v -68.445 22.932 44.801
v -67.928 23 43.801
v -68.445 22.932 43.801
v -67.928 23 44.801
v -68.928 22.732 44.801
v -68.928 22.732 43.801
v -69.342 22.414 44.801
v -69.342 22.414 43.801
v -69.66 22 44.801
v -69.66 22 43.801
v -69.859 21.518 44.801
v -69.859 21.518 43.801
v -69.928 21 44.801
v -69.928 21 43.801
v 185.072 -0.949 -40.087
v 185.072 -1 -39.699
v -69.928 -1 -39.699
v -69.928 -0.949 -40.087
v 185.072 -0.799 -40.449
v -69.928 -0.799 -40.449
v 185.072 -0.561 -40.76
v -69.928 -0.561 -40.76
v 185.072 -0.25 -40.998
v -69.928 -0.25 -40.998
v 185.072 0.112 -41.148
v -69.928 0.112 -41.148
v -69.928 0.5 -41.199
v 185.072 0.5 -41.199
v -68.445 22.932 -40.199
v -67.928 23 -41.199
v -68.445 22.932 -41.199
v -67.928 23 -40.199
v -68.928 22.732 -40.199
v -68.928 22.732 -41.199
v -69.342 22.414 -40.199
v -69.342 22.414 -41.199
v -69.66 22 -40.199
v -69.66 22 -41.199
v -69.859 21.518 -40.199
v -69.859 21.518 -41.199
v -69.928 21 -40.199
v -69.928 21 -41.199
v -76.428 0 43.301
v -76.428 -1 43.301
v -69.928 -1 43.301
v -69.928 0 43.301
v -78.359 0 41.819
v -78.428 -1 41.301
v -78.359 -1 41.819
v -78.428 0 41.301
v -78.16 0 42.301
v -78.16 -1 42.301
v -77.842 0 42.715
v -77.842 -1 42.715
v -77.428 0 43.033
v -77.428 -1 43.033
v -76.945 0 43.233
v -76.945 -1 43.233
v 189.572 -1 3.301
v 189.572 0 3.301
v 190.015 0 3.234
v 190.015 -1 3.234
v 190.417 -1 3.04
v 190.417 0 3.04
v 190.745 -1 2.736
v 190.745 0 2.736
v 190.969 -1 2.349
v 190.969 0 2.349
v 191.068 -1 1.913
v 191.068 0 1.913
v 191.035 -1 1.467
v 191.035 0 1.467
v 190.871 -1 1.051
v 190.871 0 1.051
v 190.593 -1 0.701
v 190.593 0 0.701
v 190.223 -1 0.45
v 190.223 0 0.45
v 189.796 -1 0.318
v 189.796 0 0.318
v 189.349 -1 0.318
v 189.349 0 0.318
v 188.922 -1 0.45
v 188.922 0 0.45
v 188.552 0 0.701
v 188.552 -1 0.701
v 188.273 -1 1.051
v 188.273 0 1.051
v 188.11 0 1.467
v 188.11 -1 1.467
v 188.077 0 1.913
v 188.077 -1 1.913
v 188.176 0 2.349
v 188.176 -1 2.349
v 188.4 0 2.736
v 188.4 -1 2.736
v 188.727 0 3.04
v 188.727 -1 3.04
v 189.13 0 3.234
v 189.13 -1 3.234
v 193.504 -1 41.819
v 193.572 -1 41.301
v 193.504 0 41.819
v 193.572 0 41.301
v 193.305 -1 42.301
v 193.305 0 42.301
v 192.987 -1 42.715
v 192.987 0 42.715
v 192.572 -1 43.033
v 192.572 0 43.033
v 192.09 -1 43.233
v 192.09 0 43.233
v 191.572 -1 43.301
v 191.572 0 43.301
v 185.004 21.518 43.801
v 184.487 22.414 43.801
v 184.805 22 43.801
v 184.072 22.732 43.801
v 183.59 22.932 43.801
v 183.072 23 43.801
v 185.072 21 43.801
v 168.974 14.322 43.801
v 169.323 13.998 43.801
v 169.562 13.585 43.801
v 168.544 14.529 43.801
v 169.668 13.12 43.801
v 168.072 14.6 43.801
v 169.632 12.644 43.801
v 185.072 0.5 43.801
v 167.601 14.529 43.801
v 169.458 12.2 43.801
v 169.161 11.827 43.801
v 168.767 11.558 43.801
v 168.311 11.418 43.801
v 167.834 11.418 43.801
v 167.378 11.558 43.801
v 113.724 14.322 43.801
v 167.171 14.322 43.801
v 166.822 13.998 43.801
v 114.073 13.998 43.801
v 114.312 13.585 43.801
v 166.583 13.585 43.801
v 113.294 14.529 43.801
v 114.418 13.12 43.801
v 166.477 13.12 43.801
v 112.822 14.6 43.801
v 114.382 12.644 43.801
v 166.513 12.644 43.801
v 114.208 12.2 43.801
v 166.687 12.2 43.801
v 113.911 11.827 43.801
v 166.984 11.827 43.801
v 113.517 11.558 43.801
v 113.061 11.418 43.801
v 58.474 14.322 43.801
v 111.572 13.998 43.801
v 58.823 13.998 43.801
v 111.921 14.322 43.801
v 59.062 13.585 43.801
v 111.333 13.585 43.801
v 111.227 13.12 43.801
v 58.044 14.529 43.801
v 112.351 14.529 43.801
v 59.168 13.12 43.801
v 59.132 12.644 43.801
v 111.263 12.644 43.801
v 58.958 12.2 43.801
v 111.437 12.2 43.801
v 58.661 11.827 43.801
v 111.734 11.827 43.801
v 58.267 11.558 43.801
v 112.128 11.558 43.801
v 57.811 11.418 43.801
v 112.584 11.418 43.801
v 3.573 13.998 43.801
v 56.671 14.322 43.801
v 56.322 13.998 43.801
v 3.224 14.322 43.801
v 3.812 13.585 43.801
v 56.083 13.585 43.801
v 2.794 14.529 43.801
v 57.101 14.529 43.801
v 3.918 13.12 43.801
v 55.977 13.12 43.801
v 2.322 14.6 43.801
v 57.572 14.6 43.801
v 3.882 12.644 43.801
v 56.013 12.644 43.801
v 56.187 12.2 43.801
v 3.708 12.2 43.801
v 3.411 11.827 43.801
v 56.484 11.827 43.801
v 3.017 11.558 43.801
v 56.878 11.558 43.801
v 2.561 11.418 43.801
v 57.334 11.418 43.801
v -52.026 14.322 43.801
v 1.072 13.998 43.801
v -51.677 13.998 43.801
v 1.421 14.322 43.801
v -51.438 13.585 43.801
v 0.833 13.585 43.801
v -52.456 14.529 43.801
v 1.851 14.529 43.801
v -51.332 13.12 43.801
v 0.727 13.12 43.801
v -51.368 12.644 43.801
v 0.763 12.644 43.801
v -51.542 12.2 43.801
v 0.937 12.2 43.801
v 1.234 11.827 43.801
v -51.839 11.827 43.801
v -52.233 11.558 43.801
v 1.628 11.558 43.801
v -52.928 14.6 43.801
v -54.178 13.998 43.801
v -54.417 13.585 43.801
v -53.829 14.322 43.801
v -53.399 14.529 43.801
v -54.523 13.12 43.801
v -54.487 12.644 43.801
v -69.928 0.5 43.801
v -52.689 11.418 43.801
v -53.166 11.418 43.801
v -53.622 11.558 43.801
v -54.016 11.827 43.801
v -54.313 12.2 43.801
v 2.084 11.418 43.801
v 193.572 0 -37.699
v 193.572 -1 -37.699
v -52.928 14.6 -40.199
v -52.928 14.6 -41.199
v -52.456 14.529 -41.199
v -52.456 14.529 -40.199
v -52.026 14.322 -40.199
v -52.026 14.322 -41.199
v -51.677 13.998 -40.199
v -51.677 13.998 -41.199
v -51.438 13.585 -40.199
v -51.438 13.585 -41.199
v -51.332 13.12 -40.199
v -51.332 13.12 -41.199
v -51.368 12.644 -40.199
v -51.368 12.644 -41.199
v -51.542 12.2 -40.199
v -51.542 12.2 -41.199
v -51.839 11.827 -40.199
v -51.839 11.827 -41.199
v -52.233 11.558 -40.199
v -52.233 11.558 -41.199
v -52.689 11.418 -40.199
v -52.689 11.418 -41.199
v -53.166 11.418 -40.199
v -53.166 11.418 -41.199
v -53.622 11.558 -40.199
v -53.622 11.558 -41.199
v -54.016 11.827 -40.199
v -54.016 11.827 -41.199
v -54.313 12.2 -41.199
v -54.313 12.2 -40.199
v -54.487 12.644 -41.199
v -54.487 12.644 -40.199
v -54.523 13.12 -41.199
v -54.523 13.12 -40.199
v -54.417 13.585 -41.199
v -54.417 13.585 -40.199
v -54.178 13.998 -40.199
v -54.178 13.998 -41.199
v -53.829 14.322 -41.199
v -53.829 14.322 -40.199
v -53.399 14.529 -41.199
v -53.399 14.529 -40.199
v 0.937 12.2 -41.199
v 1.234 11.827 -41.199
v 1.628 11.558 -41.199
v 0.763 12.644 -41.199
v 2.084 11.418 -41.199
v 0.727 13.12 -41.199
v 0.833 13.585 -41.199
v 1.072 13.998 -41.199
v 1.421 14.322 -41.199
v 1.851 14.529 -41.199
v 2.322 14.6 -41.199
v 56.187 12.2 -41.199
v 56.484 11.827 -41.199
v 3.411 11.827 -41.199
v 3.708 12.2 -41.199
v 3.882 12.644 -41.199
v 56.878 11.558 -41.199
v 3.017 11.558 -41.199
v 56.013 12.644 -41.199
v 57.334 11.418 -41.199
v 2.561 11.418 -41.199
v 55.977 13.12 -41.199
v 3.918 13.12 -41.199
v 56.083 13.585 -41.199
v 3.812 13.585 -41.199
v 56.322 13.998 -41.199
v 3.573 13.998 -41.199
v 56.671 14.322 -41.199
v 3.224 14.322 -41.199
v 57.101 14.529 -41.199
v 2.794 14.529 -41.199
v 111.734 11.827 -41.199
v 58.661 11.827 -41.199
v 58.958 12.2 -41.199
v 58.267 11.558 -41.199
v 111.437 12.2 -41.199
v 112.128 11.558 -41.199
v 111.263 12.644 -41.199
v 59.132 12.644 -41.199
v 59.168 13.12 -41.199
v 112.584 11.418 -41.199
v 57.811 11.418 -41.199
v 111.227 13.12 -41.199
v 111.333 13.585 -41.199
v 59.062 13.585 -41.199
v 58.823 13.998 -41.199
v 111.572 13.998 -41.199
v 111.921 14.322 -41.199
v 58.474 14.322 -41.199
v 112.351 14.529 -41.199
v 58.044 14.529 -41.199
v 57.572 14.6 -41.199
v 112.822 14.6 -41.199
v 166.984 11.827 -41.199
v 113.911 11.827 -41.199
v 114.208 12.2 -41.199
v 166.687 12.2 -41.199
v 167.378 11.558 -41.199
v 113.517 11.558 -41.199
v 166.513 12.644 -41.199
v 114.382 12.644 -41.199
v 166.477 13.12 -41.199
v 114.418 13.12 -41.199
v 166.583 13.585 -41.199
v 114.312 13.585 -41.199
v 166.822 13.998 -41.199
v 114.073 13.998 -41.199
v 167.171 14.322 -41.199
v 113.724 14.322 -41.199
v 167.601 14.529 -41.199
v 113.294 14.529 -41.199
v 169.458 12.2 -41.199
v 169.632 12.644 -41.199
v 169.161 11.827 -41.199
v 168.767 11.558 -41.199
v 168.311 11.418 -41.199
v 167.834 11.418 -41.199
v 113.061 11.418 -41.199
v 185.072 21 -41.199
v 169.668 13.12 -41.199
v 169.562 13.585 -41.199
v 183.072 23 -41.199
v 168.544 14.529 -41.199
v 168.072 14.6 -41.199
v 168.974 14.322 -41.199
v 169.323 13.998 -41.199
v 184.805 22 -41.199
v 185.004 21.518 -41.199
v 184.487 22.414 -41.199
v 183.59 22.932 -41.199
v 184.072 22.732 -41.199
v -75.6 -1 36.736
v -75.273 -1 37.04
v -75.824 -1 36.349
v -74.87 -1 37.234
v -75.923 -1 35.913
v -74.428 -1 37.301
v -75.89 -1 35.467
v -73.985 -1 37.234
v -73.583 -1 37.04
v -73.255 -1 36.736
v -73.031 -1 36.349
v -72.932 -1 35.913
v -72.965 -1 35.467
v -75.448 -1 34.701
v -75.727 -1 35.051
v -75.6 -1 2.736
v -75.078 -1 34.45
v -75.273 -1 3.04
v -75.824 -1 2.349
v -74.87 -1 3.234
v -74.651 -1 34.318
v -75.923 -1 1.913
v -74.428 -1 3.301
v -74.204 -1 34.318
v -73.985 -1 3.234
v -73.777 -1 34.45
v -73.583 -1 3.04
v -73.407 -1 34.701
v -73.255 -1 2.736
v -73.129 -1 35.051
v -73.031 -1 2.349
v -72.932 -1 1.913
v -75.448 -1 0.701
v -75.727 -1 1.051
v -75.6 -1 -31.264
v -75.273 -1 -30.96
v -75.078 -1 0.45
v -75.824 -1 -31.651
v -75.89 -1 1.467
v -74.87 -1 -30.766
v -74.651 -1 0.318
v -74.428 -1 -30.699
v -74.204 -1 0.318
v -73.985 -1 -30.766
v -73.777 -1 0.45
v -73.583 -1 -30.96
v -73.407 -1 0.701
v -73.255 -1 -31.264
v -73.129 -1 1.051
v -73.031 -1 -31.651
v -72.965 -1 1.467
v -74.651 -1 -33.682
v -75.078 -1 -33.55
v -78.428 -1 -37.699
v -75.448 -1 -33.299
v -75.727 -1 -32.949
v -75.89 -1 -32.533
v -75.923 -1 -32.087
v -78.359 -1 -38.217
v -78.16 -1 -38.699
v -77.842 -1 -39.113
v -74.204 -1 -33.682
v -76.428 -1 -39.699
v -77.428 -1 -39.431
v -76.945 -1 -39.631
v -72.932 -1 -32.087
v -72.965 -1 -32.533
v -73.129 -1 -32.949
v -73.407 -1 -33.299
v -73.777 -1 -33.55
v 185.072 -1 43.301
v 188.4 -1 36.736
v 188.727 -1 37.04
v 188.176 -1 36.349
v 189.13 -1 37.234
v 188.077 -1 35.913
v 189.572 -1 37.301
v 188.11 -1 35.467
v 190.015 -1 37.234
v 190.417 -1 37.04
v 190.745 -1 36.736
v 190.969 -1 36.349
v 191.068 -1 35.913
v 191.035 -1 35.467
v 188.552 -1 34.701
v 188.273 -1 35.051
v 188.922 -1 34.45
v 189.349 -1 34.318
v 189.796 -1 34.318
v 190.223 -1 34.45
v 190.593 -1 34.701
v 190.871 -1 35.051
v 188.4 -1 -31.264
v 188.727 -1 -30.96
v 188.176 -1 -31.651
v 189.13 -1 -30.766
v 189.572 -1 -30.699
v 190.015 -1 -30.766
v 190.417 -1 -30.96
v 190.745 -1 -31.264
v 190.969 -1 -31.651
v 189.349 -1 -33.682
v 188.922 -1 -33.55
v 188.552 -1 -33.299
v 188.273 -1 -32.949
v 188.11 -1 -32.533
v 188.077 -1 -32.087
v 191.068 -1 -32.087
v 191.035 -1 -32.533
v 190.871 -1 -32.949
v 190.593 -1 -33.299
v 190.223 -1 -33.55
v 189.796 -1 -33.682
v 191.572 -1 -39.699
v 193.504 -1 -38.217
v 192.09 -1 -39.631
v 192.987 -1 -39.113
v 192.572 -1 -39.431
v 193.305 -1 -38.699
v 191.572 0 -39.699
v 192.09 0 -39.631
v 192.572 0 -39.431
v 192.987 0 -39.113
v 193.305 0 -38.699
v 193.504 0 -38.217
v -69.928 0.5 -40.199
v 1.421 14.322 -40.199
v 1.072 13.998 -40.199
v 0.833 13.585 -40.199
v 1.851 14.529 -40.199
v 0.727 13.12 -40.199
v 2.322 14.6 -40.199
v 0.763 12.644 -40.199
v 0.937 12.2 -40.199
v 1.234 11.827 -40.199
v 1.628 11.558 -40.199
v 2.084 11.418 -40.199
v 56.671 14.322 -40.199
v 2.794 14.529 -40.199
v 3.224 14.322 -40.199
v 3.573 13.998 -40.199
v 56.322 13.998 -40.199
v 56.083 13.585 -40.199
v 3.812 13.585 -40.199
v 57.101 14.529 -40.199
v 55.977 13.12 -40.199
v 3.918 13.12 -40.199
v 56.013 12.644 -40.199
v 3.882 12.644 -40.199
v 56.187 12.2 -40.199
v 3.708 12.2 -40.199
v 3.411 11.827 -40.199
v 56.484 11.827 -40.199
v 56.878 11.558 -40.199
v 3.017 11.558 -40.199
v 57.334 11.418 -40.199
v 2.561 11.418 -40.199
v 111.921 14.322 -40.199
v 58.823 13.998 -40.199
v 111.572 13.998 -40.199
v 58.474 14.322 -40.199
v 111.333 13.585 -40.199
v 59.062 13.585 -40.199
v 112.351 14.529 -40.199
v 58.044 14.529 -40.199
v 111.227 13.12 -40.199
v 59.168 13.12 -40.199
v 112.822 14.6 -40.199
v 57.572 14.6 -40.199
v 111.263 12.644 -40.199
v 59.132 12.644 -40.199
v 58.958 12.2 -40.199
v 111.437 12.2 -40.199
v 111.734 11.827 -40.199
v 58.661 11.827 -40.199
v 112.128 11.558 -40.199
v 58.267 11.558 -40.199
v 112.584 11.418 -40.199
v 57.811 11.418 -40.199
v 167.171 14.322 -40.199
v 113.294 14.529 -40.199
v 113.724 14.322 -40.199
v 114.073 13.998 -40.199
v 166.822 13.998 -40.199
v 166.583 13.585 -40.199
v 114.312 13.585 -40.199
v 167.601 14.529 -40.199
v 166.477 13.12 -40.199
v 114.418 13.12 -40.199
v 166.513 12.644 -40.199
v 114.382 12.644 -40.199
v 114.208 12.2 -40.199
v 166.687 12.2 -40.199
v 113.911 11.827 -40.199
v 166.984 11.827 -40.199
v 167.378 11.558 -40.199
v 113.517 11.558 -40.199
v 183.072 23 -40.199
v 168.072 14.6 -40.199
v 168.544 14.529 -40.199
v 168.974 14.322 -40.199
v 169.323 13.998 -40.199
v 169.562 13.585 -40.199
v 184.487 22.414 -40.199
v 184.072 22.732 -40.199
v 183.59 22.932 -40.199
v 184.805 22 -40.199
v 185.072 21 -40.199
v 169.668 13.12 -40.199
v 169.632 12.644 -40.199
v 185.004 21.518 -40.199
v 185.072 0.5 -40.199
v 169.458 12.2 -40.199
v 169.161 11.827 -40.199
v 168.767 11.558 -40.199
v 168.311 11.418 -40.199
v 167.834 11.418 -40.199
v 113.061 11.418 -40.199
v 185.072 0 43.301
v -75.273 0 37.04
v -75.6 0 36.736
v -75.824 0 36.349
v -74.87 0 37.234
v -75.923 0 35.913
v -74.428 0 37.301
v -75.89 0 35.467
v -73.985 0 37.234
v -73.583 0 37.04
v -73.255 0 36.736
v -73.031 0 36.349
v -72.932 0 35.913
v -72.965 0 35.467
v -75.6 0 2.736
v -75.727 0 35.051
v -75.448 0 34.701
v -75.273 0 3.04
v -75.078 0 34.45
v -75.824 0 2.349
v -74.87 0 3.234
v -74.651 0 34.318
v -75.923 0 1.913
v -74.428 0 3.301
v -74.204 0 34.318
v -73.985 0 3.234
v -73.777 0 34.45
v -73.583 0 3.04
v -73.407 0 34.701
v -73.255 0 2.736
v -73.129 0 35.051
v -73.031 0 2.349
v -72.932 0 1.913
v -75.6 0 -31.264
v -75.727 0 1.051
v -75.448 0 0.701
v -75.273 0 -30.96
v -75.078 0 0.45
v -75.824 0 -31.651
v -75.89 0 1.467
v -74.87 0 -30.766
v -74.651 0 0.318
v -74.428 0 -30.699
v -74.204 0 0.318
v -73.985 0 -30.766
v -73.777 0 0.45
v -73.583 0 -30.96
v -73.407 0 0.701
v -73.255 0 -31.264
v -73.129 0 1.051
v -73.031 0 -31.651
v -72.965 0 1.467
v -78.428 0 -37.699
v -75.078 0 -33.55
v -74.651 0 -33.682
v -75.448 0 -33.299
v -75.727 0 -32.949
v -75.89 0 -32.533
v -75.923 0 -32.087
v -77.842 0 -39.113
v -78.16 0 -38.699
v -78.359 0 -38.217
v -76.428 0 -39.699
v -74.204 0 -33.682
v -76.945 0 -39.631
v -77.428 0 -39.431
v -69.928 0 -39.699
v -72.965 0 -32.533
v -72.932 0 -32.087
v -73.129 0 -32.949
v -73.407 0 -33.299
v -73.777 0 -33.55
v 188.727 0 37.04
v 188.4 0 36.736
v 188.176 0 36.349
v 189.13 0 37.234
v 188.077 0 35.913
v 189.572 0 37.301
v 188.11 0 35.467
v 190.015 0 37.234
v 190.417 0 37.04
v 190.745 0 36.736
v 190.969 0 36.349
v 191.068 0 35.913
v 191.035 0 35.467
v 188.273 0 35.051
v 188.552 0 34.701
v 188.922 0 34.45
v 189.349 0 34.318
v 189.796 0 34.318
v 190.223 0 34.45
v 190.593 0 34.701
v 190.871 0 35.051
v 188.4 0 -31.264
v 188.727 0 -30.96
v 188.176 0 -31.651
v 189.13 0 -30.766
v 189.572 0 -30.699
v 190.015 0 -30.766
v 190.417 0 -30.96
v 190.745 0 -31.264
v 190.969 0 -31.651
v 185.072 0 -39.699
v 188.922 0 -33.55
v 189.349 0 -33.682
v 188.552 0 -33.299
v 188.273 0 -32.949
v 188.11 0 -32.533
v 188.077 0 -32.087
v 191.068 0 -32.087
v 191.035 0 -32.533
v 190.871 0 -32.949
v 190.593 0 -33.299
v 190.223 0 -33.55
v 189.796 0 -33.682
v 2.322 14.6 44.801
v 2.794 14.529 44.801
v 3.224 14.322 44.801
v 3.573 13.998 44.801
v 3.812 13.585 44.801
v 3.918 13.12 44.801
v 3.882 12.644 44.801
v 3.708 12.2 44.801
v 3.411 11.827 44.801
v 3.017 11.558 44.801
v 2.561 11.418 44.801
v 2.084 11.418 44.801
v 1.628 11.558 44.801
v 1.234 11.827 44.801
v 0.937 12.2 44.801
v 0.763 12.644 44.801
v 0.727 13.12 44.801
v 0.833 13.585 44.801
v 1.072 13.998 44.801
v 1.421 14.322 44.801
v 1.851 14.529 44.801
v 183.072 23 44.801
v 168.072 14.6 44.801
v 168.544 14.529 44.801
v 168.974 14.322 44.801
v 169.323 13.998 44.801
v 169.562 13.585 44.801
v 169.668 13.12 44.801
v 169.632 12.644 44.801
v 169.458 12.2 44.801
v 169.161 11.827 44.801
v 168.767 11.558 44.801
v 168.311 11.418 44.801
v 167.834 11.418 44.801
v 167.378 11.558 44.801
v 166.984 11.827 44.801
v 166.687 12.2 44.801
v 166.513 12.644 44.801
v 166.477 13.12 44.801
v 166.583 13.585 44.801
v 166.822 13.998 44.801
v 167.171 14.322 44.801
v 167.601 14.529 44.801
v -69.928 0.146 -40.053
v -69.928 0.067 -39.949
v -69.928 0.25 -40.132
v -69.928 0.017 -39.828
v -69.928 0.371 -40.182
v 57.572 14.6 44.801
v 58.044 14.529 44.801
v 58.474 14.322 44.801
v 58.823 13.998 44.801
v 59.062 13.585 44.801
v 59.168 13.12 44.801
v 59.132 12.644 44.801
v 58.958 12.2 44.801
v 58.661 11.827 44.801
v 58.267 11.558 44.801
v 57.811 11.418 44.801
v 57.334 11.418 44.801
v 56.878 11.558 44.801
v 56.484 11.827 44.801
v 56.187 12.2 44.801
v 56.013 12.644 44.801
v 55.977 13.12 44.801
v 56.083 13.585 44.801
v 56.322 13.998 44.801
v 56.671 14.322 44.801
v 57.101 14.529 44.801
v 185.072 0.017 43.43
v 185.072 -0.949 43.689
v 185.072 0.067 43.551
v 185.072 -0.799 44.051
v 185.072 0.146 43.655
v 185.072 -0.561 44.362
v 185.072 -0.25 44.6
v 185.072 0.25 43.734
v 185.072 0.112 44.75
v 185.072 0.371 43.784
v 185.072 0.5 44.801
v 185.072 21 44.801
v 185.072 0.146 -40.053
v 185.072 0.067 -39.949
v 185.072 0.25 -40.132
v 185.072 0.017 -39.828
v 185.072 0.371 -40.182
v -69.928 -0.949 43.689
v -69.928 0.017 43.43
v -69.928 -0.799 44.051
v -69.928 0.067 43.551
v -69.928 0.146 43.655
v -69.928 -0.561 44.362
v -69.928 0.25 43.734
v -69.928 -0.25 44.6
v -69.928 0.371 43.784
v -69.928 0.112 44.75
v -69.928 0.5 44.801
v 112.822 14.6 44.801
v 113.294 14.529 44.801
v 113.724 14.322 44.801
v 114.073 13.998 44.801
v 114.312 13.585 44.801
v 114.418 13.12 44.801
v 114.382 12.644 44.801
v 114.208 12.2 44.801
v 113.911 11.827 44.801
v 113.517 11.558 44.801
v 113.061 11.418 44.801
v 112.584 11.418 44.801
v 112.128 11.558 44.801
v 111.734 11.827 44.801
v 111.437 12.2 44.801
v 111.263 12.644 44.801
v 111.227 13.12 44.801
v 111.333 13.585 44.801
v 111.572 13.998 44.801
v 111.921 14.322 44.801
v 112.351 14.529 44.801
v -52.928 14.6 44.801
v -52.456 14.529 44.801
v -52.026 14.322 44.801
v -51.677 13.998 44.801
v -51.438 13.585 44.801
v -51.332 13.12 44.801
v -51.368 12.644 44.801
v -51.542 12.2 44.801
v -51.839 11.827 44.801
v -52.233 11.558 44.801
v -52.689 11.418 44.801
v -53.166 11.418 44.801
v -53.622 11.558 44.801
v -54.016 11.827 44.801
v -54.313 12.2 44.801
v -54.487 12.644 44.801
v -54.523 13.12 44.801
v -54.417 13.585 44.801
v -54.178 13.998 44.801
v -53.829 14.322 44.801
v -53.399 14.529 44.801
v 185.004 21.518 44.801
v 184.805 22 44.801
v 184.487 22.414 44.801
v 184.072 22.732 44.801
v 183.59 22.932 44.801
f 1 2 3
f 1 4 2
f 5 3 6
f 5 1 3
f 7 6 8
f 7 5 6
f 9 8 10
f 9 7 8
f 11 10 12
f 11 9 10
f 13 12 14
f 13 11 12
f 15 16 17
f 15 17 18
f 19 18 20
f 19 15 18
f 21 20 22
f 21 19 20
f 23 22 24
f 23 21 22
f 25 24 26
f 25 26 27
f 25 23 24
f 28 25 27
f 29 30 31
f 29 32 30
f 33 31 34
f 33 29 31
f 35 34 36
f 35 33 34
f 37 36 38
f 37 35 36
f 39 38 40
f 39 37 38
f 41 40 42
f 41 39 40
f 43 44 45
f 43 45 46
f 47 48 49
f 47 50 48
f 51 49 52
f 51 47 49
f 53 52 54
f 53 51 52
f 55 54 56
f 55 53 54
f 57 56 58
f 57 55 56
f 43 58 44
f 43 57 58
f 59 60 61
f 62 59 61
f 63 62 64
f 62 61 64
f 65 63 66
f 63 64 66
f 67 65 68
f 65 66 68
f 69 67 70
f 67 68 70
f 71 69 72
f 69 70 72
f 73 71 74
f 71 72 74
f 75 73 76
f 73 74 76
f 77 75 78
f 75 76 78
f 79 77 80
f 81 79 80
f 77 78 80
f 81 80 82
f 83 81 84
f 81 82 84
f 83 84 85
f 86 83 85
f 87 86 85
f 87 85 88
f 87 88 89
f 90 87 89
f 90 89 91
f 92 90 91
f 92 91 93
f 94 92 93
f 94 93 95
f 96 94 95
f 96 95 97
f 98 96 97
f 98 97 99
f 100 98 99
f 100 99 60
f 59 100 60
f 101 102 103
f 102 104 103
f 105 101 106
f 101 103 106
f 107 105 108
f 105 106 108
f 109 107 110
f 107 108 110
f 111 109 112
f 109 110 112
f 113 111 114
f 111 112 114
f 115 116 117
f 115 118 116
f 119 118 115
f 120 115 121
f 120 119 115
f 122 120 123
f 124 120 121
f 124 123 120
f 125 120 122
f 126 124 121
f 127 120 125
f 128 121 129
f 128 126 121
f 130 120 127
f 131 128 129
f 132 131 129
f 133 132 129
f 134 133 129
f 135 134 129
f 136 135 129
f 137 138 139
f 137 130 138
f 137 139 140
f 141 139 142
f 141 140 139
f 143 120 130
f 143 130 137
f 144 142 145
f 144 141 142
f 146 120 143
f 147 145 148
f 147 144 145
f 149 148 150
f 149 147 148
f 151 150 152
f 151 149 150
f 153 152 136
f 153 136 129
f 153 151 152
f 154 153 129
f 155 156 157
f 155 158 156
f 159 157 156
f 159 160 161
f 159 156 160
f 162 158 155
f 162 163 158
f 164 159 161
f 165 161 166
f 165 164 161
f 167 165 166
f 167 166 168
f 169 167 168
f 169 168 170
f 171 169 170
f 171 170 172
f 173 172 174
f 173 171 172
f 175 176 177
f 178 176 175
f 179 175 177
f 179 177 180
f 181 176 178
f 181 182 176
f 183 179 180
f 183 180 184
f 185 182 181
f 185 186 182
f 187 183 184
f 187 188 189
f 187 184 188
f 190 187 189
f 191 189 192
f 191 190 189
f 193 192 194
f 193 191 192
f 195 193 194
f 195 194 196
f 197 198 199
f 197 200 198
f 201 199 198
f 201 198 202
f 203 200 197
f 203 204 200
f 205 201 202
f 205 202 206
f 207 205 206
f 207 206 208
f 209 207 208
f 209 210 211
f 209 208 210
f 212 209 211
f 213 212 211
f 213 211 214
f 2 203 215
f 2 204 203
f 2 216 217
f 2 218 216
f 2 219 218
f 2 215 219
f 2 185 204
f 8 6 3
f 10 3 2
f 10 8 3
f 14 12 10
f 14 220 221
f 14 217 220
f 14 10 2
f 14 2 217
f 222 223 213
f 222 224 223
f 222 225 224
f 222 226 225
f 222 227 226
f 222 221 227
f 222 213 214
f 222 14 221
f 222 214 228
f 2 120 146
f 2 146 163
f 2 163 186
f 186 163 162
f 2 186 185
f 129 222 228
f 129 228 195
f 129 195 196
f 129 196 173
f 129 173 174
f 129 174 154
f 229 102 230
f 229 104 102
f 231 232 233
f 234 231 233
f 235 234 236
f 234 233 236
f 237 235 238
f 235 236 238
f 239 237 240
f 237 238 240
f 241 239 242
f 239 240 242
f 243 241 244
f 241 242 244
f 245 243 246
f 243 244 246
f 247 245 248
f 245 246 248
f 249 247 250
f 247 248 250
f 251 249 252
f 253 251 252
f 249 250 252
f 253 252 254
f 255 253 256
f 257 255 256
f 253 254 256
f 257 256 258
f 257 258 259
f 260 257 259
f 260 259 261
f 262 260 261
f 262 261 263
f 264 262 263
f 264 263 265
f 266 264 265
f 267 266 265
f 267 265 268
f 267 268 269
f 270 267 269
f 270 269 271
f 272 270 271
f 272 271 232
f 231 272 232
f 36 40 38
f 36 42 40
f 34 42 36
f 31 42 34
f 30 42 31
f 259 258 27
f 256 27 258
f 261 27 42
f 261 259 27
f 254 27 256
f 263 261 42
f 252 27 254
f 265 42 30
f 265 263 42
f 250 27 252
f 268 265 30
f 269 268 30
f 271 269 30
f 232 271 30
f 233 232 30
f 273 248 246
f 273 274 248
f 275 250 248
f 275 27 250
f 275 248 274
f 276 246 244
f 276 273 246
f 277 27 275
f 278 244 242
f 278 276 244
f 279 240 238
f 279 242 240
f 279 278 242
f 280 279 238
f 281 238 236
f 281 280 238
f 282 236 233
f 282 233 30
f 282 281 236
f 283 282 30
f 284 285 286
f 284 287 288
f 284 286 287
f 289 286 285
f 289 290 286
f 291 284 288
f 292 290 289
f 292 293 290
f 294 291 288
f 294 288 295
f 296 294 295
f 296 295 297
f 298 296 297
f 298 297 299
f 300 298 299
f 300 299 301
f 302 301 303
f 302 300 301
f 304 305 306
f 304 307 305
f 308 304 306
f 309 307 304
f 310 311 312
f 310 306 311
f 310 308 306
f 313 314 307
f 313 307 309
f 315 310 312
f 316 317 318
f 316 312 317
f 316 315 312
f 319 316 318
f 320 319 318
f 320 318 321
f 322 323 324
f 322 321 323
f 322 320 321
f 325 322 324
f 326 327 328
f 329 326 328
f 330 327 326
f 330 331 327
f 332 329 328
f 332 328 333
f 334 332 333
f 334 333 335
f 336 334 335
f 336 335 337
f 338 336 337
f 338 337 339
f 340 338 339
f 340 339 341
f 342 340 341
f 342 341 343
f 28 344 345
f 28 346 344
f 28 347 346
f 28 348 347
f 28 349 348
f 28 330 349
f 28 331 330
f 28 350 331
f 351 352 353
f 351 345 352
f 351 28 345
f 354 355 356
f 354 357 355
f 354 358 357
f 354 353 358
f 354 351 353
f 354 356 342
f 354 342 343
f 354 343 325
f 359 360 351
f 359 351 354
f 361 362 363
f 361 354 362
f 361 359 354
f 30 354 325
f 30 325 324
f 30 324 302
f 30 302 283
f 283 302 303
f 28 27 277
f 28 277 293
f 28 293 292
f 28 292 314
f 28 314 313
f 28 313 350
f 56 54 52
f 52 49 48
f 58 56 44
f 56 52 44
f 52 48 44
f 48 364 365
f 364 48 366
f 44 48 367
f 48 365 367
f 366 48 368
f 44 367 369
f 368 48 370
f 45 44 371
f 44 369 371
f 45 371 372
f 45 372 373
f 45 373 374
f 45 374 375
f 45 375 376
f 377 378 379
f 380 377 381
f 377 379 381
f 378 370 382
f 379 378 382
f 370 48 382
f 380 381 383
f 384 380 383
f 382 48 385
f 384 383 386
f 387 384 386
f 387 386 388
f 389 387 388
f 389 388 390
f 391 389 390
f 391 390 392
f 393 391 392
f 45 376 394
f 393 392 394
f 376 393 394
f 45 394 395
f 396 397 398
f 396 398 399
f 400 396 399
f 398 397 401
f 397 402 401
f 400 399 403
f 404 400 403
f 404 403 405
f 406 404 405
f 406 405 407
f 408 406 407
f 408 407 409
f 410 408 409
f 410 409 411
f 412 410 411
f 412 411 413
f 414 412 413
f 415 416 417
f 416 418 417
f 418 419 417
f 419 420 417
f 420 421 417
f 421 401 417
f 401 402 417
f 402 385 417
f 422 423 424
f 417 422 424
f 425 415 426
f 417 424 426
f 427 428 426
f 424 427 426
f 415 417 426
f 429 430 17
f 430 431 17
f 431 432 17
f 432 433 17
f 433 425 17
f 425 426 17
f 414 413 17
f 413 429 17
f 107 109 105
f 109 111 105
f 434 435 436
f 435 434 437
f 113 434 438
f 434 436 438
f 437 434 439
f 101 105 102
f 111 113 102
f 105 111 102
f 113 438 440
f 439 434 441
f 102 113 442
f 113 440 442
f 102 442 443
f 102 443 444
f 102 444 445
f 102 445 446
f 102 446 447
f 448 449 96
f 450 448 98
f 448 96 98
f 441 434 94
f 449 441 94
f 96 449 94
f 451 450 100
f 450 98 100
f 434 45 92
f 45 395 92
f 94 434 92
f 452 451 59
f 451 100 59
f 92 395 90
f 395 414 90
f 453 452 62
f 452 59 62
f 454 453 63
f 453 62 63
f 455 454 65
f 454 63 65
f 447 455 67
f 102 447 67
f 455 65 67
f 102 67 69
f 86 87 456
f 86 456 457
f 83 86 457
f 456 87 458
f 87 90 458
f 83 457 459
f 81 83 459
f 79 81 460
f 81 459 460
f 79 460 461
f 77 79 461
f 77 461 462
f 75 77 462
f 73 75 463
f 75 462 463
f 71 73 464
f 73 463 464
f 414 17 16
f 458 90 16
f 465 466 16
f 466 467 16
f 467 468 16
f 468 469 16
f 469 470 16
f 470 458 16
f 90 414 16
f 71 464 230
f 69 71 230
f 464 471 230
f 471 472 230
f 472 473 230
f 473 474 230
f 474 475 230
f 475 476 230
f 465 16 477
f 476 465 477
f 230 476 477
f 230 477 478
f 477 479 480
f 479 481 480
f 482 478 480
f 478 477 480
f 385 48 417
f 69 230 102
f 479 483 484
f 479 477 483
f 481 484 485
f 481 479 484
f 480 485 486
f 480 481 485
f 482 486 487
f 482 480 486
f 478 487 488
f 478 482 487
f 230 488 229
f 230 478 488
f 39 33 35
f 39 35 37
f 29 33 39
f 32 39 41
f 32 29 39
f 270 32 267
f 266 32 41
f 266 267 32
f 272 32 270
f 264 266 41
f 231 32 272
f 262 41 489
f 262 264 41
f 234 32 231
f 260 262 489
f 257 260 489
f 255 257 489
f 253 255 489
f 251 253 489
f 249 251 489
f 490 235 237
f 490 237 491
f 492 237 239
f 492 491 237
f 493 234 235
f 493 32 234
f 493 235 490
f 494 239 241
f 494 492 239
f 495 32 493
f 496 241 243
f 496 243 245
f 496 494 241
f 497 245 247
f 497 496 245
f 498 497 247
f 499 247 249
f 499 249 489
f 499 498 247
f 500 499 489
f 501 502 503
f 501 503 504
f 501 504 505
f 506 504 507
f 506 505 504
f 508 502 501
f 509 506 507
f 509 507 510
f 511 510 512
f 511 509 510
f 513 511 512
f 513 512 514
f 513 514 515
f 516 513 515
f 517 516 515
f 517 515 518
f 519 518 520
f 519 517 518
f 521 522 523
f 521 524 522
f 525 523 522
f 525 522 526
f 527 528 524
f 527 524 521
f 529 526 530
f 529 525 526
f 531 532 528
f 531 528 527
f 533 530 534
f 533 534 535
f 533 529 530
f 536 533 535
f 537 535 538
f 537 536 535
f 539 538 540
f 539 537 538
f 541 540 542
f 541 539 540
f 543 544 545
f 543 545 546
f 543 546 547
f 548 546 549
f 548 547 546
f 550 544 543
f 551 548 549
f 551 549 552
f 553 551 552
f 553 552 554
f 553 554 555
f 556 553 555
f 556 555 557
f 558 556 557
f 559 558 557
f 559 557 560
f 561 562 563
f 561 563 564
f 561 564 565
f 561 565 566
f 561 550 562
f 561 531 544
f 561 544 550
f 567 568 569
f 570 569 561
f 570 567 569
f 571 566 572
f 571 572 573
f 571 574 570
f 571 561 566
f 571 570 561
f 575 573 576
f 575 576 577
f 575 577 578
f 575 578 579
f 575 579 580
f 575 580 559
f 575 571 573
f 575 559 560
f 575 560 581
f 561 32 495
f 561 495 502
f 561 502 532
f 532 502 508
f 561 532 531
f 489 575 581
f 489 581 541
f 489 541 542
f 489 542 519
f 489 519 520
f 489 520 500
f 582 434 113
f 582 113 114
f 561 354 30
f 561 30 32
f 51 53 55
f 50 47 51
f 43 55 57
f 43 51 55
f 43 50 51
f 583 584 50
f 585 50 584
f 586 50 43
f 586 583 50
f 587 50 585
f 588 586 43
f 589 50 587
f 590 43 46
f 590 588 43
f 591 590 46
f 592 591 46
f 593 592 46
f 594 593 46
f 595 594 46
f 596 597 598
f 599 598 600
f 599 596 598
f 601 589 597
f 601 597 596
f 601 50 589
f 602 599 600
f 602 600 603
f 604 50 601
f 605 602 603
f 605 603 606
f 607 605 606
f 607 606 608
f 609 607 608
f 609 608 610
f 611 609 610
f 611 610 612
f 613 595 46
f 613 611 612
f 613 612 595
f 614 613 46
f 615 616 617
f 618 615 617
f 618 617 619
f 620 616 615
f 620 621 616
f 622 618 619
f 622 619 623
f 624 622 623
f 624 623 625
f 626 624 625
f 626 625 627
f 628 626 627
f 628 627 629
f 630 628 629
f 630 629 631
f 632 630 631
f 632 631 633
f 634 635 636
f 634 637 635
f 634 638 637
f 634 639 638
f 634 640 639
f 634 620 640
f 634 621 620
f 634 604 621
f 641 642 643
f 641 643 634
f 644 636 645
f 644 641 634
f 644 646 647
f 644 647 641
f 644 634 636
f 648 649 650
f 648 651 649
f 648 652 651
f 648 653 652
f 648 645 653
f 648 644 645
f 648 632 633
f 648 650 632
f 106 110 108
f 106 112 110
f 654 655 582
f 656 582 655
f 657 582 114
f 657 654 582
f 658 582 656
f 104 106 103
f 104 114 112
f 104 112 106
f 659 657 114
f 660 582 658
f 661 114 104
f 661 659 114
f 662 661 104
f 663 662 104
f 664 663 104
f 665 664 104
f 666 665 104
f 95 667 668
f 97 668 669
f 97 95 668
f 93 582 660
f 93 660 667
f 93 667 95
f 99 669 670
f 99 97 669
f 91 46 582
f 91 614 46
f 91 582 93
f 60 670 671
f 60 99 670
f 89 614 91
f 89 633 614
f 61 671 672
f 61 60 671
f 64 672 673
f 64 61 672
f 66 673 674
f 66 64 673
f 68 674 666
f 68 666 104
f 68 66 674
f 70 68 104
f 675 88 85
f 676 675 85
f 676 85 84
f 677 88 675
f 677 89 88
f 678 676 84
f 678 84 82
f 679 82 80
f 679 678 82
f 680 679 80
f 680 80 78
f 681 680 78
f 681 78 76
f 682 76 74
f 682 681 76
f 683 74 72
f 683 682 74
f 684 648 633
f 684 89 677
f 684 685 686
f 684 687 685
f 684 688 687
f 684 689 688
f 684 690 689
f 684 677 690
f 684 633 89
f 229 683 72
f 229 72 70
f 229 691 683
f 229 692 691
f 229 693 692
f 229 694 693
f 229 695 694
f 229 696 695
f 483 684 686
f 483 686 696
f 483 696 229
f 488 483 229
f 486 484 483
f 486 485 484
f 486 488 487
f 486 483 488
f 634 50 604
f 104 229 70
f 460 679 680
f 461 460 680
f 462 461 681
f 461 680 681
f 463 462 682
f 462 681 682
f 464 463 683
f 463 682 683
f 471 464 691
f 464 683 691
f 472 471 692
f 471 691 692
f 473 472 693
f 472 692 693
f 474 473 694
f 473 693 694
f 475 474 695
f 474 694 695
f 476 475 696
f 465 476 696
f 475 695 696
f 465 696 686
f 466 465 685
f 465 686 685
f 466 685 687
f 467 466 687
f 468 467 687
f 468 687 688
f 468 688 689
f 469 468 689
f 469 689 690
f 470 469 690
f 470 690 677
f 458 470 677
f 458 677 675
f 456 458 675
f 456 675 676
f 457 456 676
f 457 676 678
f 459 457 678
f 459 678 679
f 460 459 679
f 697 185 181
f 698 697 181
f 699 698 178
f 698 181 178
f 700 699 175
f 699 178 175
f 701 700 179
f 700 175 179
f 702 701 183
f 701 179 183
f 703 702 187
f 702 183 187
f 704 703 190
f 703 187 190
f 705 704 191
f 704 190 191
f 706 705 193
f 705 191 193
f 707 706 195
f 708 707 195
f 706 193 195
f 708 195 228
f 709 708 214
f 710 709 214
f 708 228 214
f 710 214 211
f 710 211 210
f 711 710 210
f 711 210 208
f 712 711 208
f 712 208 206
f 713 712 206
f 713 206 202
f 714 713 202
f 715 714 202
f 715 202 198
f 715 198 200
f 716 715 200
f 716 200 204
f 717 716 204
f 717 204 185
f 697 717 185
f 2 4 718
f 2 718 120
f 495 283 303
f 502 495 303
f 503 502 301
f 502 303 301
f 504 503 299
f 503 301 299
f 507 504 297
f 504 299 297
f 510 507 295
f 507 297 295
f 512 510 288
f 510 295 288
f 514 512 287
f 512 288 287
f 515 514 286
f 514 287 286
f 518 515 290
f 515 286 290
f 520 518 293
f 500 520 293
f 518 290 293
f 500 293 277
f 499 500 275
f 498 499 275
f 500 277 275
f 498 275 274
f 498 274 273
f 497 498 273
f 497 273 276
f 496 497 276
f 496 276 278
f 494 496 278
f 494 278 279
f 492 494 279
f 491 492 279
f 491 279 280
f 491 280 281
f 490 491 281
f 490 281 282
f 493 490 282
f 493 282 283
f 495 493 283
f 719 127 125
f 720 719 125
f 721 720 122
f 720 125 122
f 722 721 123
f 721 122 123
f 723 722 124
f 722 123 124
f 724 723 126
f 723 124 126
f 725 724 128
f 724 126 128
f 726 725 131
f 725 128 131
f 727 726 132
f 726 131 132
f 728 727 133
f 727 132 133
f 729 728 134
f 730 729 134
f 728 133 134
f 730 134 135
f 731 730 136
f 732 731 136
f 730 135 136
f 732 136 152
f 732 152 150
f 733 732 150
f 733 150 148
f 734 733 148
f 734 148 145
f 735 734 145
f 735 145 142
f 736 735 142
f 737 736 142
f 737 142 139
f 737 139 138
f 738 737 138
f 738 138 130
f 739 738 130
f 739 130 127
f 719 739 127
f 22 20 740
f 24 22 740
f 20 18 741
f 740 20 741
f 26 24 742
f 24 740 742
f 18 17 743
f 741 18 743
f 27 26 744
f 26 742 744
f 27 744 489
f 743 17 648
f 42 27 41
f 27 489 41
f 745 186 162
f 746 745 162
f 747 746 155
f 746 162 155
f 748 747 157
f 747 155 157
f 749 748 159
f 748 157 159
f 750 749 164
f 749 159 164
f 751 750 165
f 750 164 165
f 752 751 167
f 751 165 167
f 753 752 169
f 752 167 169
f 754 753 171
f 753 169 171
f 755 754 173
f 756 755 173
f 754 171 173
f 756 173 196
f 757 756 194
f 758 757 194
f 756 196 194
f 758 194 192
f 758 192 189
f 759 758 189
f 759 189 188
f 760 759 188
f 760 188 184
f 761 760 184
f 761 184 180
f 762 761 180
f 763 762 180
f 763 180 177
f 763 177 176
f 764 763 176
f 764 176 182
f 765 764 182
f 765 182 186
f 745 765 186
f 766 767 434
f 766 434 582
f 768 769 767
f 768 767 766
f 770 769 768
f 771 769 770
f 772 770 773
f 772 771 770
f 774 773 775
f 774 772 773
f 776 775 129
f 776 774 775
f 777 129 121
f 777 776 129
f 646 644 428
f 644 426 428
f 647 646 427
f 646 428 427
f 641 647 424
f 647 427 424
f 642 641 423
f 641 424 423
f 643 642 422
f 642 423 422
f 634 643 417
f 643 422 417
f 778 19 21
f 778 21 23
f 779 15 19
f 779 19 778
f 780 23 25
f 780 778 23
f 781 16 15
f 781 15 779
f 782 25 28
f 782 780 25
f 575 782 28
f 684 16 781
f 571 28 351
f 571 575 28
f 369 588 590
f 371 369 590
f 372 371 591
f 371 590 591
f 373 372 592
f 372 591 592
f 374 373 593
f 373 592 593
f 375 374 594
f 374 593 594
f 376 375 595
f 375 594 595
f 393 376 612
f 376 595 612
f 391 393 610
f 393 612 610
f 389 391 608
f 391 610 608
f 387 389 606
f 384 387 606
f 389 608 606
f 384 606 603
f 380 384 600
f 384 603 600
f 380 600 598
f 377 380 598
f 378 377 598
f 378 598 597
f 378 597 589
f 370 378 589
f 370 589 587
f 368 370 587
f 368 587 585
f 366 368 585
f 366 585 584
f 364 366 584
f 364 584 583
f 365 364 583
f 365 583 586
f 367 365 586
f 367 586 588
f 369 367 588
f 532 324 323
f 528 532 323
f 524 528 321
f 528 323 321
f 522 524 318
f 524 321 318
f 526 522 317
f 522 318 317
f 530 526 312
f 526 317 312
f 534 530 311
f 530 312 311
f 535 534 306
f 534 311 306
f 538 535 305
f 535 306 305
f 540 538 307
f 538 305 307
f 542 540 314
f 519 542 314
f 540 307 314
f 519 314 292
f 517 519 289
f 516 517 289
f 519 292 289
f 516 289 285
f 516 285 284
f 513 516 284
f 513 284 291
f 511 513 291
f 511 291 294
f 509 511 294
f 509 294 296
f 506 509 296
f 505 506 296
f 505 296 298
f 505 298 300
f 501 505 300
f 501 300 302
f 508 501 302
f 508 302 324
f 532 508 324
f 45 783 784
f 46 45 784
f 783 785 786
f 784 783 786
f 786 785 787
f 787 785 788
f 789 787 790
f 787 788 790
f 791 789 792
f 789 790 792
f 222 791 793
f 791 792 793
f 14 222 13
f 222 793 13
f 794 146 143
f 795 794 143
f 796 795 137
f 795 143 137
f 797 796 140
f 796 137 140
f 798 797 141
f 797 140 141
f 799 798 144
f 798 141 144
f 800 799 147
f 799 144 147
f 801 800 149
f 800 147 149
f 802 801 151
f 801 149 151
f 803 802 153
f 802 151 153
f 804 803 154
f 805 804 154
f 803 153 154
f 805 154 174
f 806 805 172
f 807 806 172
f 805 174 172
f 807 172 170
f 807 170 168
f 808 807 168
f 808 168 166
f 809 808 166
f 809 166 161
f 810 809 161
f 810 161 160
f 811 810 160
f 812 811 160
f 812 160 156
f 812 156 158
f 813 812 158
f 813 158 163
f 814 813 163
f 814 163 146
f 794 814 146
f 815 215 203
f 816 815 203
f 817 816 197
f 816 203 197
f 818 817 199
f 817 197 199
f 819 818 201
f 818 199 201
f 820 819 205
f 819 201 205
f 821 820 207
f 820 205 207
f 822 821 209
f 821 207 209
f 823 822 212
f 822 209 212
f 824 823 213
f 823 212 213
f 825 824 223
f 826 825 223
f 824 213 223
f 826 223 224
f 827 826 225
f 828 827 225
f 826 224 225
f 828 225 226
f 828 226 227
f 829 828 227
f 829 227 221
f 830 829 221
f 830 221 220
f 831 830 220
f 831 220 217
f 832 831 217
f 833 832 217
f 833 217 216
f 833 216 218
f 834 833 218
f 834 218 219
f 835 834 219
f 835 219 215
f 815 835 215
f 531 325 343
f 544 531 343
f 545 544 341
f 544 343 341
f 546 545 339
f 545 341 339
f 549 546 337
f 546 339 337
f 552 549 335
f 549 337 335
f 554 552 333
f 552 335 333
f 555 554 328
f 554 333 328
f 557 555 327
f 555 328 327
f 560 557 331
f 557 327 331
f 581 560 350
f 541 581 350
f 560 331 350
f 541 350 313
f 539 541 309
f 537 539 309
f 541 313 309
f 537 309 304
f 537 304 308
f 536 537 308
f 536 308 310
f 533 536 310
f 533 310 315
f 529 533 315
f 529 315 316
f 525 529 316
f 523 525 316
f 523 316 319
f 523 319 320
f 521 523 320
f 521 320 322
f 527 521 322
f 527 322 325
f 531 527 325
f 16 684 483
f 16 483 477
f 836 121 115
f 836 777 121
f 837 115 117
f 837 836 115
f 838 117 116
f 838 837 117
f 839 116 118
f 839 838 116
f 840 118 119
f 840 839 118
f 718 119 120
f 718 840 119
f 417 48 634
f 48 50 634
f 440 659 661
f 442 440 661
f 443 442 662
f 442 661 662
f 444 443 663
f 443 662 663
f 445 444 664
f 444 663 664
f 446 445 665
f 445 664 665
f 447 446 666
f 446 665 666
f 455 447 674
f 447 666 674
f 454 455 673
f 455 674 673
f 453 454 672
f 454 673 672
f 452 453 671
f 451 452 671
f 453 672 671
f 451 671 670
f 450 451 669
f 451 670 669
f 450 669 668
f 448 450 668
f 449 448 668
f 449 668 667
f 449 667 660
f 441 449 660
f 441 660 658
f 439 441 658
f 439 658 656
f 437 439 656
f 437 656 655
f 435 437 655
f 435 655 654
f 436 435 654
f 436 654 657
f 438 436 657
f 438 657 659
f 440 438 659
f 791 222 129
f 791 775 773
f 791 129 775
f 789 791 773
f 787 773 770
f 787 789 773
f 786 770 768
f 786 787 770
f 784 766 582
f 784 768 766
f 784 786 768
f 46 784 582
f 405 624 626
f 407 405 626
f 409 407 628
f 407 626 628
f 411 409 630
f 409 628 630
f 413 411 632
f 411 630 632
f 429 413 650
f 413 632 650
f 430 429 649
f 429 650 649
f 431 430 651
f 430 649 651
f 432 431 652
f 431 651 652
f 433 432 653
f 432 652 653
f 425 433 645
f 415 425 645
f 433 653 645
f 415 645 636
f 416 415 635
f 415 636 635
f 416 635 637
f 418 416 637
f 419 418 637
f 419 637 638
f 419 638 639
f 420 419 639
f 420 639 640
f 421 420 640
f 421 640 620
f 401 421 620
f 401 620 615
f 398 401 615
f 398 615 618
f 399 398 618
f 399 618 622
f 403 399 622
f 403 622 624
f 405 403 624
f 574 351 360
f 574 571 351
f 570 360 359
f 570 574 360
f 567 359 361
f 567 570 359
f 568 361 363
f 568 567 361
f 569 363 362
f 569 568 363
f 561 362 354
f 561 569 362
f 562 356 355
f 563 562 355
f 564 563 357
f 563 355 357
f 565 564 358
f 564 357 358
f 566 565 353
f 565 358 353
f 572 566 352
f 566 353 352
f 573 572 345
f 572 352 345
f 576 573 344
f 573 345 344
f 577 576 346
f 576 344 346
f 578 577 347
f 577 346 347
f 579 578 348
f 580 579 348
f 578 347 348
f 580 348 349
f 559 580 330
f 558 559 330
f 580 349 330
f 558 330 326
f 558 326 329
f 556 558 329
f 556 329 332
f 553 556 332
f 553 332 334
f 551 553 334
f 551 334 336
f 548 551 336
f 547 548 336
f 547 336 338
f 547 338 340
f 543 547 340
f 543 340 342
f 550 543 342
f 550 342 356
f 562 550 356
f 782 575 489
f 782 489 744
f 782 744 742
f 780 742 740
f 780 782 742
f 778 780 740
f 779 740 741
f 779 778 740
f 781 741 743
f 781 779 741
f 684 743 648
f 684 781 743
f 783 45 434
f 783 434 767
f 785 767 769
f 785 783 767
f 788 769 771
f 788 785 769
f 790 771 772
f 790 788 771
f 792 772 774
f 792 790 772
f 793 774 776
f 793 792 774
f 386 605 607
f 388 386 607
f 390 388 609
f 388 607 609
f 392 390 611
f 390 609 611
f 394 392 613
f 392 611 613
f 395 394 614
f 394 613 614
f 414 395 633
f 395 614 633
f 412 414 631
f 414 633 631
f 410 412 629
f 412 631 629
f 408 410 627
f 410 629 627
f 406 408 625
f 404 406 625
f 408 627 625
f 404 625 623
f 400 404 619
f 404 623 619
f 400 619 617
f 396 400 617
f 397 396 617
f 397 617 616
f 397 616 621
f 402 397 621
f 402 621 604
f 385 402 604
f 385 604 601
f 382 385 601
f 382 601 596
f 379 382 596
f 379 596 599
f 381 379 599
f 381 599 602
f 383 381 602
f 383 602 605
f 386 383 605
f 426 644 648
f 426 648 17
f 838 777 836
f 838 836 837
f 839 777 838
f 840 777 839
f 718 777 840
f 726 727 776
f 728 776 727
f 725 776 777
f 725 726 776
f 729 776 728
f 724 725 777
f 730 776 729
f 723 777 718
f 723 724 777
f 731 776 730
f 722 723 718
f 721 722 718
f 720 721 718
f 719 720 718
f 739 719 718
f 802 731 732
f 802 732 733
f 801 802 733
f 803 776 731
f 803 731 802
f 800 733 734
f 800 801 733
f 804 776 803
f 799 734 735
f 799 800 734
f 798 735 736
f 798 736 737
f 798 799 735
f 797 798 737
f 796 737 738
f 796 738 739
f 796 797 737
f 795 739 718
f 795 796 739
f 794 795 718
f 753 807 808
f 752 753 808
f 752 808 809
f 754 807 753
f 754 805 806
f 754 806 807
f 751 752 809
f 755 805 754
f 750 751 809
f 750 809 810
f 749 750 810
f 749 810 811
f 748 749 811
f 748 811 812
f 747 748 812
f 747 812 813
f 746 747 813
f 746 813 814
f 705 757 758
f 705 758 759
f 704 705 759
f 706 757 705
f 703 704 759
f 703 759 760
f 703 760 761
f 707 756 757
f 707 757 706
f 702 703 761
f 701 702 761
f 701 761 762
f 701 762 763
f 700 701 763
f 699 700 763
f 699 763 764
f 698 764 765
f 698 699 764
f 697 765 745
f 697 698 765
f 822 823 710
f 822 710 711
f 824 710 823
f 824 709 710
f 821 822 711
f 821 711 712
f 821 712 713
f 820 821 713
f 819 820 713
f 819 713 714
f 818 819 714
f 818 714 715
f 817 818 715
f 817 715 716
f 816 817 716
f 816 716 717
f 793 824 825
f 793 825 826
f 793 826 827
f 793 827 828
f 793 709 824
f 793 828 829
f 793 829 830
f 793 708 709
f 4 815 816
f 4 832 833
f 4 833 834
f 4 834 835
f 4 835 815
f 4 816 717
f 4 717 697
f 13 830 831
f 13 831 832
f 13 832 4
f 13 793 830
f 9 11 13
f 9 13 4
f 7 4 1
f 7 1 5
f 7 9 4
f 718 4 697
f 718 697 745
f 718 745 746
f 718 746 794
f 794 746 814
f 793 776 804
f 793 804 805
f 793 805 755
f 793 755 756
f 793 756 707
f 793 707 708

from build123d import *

# Parameters (mm, degrees)
SKETCH1_W                      = 272
SKETCH1_H                      = 84
BASE_FLANGE1_DEPTH             = 1
EDGE_FLANGE1_STRIP_W           = 5
EDGE_FLANGE1_STRIP_H           = 1
EDGE_FLANGE1_STRIP_CUT_DEPTH   = 272
EDGE_FLANGE1_STRIP_2_W         = 5
EDGE_FLANGE1_STRIP_2_H         = 1
EDGE_FLANGE1_STRIP_CUT_2_DEPTH = 272
EDGE_FLANGE1_DEPTH             = 272
EDGE_FLANGE1_BEND_DEPTH        = 272
CUT_EXTRUDE1_START             = -78.427547771
CUT_EXTRUDE1_DEPTH             = 8.5
CUT_EXTRUDE1_START_2           = 185.072452229
CUT_EXTRUDE1_2_DEPTH           = 8.5
SKETCH13_R                     = 1.6
CUT_EXTRUDE2_DEPTH             = 100
SKETCH14_R                     = 1.5
CUT_EXTRUDE3_DEPTH             = 100
FILLET1_R                      = 2
FILLET2_R                      = 2
FILLET3_R                      = 2
FILLET4_R                      = 2
FILLET5_R                      = 2
FILLET6_R                      = 2
FILLET7_R                      = 2
FILLET8_R                      = 2


# Read off the part's stored shape, not the designer's step: Cut-Extrude1
# Sheet-metal steps are written as plain solids
with BuildPart() as part:
    # Sketch1 → Base-Flange1 (new body)
    with BuildSketch(Plane(origin=(0, 0, 0), x_dir=(1, 0, 0), z_dir=(0, 1, 0))):
        with Locations((57.572452229, -1.800955414)):
            Rectangle(SKETCH1_W, SKETCH1_H)
    extrude(amount=-BASE_FLANGE1_DEPTH)

    # Edge-Flange1 strip (across the edge) → Edge-Flange1 strip cut (cut)
    with BuildSketch(Plane(origin=(-78.427547771, 0, 43.800955414), x_dir=(0, 0, -1), z_dir=(1, 0, 0))):
        with Locations((-2, -0.5)):
            Rectangle(EDGE_FLANGE1_STRIP_W, EDGE_FLANGE1_STRIP_H)
    extrude(amount=EDGE_FLANGE1_STRIP_CUT_DEPTH, mode=Mode.SUBTRACT)

    # Edge-Flange1 strip 2 (across the edge) → Edge-Flange1 strip cut 2 (cut)
    with BuildSketch(Plane(origin=(193.572452229, 0, -40.199044586), x_dir=(0, 0, 1), z_dir=(-1, 0, 0))):
        with Locations((-2, -0.5)):
            Rectangle(EDGE_FLANGE1_STRIP_2_W, EDGE_FLANGE1_STRIP_2_H)
    extrude(amount=EDGE_FLANGE1_STRIP_CUT_2_DEPTH, mode=Mode.SUBTRACT)

    # Edge-Flange1 section (across the edge) → Edge-Flange1 (add)
    with BuildSketch(Plane(origin=(-78.427547771, 0, 43.800955414), x_dir=(0, 0, -1), z_dir=(1, 0, 0))):
        with BuildLine():
            Line((-1, 0.5), (-1, 23))
            Line((-1, 23), (0, 23))
            Line((0, 23), (0, 0.5))
            ThreePointArc((0, 0.5), (0.146446609, 0.146446609), (0.5, 0))
            Line((0.5, 0), (0.5, -1))
            ThreePointArc((0.5, -1), (-0.560660172, -0.560660172), (-1, 0.5))
        make_face()
    extrude(amount=EDGE_FLANGE1_DEPTH)

    # Edge-Flange1 section 2 (across the edge) → Edge-Flange1 bend (add)
    with BuildSketch(Plane(origin=(193.572452229, 0, -40.199044586), x_dir=(0, 0, 1), z_dir=(-1, 0, 0))):
        with BuildLine():
            Line((-1, 0.5), (-1, 23))
            Line((-1, 23), (0, 23))
            Line((0, 23), (0, 0.5))
            ThreePointArc((0, 0.5), (0.146446609, 0.146446609), (0.5, 0))
            Line((0.5, 0), (0.5, -1))
            ThreePointArc((0.5, -1), (-0.560660172, -0.560660172), (-1, 0.5))
        make_face()
    extrude(amount=EDGE_FLANGE1_BEND_DEPTH)

    # Cut-Extrude1 outline → Cut-Extrude1 (cut)
    with BuildSketch(Plane.YZ.offset(CUT_EXTRUDE1_START)):
        with BuildLine():
            ThreePointArc((0.5, -40.199044586), (0.146446609, -40.052597977), (0, -39.699044586))
            Line((0, -39.699044586), (-1, -39.699044586))
            ThreePointArc((-1, -39.699044586), (-0.560660172, -40.759704758), (0.5, -41.199044586))
            Line((0.5, -41.199044586), (23, -41.199044586))
            Line((23, -41.199044586), (23, -40.199044586))
            Line((23, -40.199044586), (0.5, -40.199044586))
        make_face()
        with BuildLine():
            ThreePointArc((0.5, 44.800955414), (-0.560660172, 44.361615586), (-1, 43.300955414))
            Line((-1, 43.300955414), (0, 43.300955414))
            ThreePointArc((0, 43.300955414), (0.146446609, 43.654508805), (0.5, 43.800955414))
            Line((0.5, 43.800955414), (23, 43.800955414))
            Line((23, 43.800955414), (23, 44.800955414))
            Line((23, 44.800955414), (0.5, 44.800955414))
        make_face()
    extrude(amount=CUT_EXTRUDE1_DEPTH, mode=Mode.SUBTRACT)

    # Cut-Extrude1 2 outline → Cut-Extrude1 2 (cut)
    with BuildSketch(Plane.YZ.offset(CUT_EXTRUDE1_START_2)):
        with BuildLine():
            ThreePointArc((0.5, -40.199044586), (0.146446609, -40.052597977), (0, -39.699044586))
            Line((0, -39.699044586), (-1, -39.699044586))
            ThreePointArc((-1, -39.699044586), (-0.560660172, -40.759704758), (0.5, -41.199044586))
            Line((0.5, -41.199044586), (23, -41.199044586))
            Line((23, -41.199044586), (23, -40.199044586))
            Line((23, -40.199044586), (0.5, -40.199044586))
        make_face()
        with BuildLine():
            ThreePointArc((0.5, 44.800955414), (-0.560660172, 44.361615586), (-1, 43.300955414))
            Line((-1, 43.300955414), (0, 43.300955414))
            ThreePointArc((0, 43.300955414), (0.146446609, 43.654508805), (0.5, 43.800955414))
            Line((0.5, 43.800955414), (23, 43.800955414))
            Line((23, 43.800955414), (23, 44.800955414))
            Line((23, 44.800955414), (0.5, 44.800955414))
        make_face()
    extrude(amount=CUT_EXTRUDE1_2_DEPTH, mode=Mode.SUBTRACT)

    # Sketch13 → Cut-Extrude2 (cut)
    with BuildSketch(Plane(origin=(0, 0, -41.199044586), x_dir=(-1, 0, 0), z_dir=(0, 0, -1))):
        with Locations(Location((-168.072452229, 13, 0), (0, 0, 90))):
            Circle(SKETCH13_R)
        with Locations(Location((-112.822452229, 13, 0), (0, 0, 90))):
            Circle(SKETCH13_R)
        with Locations(Location((-57.572452229, 13, 0), (0, 0, 90))):
            Circle(SKETCH13_R)
        with Locations(Location((-2.322452229, 13, 0), (0, 0, 90))):
            Circle(SKETCH13_R)
        with Locations(Location((52.927547771, 13, 0), (0, 0, 90))):
            Circle(SKETCH13_R)
    extrude(amount=-CUT_EXTRUDE2_DEPTH, mode=Mode.SUBTRACT)

    # Sketch14 → Cut-Extrude3 (cut)
    with BuildSketch(Plane(origin=(0, 0, 0), x_dir=(1, 0, 0), z_dir=(0, 1, 0))):
        with Locations(Location((-74.427547771, -1.800955414, 0), (0, 0, 270))):
            Circle(SKETCH14_R)
        with Locations(Location((-74.427547771, 32.199044586, 0), (0, 0, 270))):
            Circle(SKETCH14_R)
        with Locations(Location((-74.427547771, -35.800955414, 0), (0, 0, 270))):
            Circle(SKETCH14_R)
        with Locations(Location((189.572452229, -35.800955414, 0), (0, 0, 270))):
            Circle(SKETCH14_R)
        with Locations(Location((189.572452229, -1.800955414, 0), (0, 0, 270))):
            Circle(SKETCH14_R)
        with Locations(Location((189.572452229, 32.199044586, 0), (0, 0, 270))):
            Circle(SKETCH14_R)
    extrude(amount=-CUT_EXTRUDE3_DEPTH, mode=Mode.SUBTRACT)

    # Fillet1
    fillet1_edges = [part.edges().sort_by_distance(p)[0] for p in [
        (193.572452229, -0.5, -39.699044586),
    ]]
    fillet(fillet1_edges, radius=FILLET1_R)

    # Fillet2
    fillet2_edges = [part.edges().sort_by_distance(p)[0] for p in [
        (193.572452229, -0.5, 43.300955414),
    ]]
    fillet(fillet2_edges, radius=FILLET2_R)

    # Fillet3
    fillet3_edges = [part.edges().sort_by_distance(p)[0] for p in [
        (-78.427547771, -0.5, -39.699044586),
    ]]
    fillet(fillet3_edges, radius=FILLET3_R)

    # Fillet4
    fillet4_edges = [part.edges().sort_by_distance(p)[0] for p in [
        (-78.427547771, -0.5, 43.300955414),
    ]]
    fillet(fillet4_edges, radius=FILLET4_R)

    # Fillet5
    fillet5_edges = [part.edges().sort_by_distance(p)[0] for p in [
        (185.072452229, 23, -40.699044586),
    ]]
    fillet(fillet5_edges, radius=FILLET5_R)

    # Fillet6
    fillet6_edges = [part.edges().sort_by_distance(p)[0] for p in [
        (-69.927547771, 23, -40.699044586),
    ]]
    fillet(fillet6_edges, radius=FILLET6_R)

    # Fillet7
    fillet7_edges = [part.edges().sort_by_distance(p)[0] for p in [
        (185.072452229, 23, 44.300955414),
    ]]
    fillet(fillet7_edges, radius=FILLET7_R)

    # Fillet8
    fillet8_edges = [part.edges().sort_by_distance(p)[0] for p in [
        (-69.927547771, 23, 44.300955414),
    ]]
    fillet(fillet8_edges, radius=FILLET8_R)


solid = part.part
